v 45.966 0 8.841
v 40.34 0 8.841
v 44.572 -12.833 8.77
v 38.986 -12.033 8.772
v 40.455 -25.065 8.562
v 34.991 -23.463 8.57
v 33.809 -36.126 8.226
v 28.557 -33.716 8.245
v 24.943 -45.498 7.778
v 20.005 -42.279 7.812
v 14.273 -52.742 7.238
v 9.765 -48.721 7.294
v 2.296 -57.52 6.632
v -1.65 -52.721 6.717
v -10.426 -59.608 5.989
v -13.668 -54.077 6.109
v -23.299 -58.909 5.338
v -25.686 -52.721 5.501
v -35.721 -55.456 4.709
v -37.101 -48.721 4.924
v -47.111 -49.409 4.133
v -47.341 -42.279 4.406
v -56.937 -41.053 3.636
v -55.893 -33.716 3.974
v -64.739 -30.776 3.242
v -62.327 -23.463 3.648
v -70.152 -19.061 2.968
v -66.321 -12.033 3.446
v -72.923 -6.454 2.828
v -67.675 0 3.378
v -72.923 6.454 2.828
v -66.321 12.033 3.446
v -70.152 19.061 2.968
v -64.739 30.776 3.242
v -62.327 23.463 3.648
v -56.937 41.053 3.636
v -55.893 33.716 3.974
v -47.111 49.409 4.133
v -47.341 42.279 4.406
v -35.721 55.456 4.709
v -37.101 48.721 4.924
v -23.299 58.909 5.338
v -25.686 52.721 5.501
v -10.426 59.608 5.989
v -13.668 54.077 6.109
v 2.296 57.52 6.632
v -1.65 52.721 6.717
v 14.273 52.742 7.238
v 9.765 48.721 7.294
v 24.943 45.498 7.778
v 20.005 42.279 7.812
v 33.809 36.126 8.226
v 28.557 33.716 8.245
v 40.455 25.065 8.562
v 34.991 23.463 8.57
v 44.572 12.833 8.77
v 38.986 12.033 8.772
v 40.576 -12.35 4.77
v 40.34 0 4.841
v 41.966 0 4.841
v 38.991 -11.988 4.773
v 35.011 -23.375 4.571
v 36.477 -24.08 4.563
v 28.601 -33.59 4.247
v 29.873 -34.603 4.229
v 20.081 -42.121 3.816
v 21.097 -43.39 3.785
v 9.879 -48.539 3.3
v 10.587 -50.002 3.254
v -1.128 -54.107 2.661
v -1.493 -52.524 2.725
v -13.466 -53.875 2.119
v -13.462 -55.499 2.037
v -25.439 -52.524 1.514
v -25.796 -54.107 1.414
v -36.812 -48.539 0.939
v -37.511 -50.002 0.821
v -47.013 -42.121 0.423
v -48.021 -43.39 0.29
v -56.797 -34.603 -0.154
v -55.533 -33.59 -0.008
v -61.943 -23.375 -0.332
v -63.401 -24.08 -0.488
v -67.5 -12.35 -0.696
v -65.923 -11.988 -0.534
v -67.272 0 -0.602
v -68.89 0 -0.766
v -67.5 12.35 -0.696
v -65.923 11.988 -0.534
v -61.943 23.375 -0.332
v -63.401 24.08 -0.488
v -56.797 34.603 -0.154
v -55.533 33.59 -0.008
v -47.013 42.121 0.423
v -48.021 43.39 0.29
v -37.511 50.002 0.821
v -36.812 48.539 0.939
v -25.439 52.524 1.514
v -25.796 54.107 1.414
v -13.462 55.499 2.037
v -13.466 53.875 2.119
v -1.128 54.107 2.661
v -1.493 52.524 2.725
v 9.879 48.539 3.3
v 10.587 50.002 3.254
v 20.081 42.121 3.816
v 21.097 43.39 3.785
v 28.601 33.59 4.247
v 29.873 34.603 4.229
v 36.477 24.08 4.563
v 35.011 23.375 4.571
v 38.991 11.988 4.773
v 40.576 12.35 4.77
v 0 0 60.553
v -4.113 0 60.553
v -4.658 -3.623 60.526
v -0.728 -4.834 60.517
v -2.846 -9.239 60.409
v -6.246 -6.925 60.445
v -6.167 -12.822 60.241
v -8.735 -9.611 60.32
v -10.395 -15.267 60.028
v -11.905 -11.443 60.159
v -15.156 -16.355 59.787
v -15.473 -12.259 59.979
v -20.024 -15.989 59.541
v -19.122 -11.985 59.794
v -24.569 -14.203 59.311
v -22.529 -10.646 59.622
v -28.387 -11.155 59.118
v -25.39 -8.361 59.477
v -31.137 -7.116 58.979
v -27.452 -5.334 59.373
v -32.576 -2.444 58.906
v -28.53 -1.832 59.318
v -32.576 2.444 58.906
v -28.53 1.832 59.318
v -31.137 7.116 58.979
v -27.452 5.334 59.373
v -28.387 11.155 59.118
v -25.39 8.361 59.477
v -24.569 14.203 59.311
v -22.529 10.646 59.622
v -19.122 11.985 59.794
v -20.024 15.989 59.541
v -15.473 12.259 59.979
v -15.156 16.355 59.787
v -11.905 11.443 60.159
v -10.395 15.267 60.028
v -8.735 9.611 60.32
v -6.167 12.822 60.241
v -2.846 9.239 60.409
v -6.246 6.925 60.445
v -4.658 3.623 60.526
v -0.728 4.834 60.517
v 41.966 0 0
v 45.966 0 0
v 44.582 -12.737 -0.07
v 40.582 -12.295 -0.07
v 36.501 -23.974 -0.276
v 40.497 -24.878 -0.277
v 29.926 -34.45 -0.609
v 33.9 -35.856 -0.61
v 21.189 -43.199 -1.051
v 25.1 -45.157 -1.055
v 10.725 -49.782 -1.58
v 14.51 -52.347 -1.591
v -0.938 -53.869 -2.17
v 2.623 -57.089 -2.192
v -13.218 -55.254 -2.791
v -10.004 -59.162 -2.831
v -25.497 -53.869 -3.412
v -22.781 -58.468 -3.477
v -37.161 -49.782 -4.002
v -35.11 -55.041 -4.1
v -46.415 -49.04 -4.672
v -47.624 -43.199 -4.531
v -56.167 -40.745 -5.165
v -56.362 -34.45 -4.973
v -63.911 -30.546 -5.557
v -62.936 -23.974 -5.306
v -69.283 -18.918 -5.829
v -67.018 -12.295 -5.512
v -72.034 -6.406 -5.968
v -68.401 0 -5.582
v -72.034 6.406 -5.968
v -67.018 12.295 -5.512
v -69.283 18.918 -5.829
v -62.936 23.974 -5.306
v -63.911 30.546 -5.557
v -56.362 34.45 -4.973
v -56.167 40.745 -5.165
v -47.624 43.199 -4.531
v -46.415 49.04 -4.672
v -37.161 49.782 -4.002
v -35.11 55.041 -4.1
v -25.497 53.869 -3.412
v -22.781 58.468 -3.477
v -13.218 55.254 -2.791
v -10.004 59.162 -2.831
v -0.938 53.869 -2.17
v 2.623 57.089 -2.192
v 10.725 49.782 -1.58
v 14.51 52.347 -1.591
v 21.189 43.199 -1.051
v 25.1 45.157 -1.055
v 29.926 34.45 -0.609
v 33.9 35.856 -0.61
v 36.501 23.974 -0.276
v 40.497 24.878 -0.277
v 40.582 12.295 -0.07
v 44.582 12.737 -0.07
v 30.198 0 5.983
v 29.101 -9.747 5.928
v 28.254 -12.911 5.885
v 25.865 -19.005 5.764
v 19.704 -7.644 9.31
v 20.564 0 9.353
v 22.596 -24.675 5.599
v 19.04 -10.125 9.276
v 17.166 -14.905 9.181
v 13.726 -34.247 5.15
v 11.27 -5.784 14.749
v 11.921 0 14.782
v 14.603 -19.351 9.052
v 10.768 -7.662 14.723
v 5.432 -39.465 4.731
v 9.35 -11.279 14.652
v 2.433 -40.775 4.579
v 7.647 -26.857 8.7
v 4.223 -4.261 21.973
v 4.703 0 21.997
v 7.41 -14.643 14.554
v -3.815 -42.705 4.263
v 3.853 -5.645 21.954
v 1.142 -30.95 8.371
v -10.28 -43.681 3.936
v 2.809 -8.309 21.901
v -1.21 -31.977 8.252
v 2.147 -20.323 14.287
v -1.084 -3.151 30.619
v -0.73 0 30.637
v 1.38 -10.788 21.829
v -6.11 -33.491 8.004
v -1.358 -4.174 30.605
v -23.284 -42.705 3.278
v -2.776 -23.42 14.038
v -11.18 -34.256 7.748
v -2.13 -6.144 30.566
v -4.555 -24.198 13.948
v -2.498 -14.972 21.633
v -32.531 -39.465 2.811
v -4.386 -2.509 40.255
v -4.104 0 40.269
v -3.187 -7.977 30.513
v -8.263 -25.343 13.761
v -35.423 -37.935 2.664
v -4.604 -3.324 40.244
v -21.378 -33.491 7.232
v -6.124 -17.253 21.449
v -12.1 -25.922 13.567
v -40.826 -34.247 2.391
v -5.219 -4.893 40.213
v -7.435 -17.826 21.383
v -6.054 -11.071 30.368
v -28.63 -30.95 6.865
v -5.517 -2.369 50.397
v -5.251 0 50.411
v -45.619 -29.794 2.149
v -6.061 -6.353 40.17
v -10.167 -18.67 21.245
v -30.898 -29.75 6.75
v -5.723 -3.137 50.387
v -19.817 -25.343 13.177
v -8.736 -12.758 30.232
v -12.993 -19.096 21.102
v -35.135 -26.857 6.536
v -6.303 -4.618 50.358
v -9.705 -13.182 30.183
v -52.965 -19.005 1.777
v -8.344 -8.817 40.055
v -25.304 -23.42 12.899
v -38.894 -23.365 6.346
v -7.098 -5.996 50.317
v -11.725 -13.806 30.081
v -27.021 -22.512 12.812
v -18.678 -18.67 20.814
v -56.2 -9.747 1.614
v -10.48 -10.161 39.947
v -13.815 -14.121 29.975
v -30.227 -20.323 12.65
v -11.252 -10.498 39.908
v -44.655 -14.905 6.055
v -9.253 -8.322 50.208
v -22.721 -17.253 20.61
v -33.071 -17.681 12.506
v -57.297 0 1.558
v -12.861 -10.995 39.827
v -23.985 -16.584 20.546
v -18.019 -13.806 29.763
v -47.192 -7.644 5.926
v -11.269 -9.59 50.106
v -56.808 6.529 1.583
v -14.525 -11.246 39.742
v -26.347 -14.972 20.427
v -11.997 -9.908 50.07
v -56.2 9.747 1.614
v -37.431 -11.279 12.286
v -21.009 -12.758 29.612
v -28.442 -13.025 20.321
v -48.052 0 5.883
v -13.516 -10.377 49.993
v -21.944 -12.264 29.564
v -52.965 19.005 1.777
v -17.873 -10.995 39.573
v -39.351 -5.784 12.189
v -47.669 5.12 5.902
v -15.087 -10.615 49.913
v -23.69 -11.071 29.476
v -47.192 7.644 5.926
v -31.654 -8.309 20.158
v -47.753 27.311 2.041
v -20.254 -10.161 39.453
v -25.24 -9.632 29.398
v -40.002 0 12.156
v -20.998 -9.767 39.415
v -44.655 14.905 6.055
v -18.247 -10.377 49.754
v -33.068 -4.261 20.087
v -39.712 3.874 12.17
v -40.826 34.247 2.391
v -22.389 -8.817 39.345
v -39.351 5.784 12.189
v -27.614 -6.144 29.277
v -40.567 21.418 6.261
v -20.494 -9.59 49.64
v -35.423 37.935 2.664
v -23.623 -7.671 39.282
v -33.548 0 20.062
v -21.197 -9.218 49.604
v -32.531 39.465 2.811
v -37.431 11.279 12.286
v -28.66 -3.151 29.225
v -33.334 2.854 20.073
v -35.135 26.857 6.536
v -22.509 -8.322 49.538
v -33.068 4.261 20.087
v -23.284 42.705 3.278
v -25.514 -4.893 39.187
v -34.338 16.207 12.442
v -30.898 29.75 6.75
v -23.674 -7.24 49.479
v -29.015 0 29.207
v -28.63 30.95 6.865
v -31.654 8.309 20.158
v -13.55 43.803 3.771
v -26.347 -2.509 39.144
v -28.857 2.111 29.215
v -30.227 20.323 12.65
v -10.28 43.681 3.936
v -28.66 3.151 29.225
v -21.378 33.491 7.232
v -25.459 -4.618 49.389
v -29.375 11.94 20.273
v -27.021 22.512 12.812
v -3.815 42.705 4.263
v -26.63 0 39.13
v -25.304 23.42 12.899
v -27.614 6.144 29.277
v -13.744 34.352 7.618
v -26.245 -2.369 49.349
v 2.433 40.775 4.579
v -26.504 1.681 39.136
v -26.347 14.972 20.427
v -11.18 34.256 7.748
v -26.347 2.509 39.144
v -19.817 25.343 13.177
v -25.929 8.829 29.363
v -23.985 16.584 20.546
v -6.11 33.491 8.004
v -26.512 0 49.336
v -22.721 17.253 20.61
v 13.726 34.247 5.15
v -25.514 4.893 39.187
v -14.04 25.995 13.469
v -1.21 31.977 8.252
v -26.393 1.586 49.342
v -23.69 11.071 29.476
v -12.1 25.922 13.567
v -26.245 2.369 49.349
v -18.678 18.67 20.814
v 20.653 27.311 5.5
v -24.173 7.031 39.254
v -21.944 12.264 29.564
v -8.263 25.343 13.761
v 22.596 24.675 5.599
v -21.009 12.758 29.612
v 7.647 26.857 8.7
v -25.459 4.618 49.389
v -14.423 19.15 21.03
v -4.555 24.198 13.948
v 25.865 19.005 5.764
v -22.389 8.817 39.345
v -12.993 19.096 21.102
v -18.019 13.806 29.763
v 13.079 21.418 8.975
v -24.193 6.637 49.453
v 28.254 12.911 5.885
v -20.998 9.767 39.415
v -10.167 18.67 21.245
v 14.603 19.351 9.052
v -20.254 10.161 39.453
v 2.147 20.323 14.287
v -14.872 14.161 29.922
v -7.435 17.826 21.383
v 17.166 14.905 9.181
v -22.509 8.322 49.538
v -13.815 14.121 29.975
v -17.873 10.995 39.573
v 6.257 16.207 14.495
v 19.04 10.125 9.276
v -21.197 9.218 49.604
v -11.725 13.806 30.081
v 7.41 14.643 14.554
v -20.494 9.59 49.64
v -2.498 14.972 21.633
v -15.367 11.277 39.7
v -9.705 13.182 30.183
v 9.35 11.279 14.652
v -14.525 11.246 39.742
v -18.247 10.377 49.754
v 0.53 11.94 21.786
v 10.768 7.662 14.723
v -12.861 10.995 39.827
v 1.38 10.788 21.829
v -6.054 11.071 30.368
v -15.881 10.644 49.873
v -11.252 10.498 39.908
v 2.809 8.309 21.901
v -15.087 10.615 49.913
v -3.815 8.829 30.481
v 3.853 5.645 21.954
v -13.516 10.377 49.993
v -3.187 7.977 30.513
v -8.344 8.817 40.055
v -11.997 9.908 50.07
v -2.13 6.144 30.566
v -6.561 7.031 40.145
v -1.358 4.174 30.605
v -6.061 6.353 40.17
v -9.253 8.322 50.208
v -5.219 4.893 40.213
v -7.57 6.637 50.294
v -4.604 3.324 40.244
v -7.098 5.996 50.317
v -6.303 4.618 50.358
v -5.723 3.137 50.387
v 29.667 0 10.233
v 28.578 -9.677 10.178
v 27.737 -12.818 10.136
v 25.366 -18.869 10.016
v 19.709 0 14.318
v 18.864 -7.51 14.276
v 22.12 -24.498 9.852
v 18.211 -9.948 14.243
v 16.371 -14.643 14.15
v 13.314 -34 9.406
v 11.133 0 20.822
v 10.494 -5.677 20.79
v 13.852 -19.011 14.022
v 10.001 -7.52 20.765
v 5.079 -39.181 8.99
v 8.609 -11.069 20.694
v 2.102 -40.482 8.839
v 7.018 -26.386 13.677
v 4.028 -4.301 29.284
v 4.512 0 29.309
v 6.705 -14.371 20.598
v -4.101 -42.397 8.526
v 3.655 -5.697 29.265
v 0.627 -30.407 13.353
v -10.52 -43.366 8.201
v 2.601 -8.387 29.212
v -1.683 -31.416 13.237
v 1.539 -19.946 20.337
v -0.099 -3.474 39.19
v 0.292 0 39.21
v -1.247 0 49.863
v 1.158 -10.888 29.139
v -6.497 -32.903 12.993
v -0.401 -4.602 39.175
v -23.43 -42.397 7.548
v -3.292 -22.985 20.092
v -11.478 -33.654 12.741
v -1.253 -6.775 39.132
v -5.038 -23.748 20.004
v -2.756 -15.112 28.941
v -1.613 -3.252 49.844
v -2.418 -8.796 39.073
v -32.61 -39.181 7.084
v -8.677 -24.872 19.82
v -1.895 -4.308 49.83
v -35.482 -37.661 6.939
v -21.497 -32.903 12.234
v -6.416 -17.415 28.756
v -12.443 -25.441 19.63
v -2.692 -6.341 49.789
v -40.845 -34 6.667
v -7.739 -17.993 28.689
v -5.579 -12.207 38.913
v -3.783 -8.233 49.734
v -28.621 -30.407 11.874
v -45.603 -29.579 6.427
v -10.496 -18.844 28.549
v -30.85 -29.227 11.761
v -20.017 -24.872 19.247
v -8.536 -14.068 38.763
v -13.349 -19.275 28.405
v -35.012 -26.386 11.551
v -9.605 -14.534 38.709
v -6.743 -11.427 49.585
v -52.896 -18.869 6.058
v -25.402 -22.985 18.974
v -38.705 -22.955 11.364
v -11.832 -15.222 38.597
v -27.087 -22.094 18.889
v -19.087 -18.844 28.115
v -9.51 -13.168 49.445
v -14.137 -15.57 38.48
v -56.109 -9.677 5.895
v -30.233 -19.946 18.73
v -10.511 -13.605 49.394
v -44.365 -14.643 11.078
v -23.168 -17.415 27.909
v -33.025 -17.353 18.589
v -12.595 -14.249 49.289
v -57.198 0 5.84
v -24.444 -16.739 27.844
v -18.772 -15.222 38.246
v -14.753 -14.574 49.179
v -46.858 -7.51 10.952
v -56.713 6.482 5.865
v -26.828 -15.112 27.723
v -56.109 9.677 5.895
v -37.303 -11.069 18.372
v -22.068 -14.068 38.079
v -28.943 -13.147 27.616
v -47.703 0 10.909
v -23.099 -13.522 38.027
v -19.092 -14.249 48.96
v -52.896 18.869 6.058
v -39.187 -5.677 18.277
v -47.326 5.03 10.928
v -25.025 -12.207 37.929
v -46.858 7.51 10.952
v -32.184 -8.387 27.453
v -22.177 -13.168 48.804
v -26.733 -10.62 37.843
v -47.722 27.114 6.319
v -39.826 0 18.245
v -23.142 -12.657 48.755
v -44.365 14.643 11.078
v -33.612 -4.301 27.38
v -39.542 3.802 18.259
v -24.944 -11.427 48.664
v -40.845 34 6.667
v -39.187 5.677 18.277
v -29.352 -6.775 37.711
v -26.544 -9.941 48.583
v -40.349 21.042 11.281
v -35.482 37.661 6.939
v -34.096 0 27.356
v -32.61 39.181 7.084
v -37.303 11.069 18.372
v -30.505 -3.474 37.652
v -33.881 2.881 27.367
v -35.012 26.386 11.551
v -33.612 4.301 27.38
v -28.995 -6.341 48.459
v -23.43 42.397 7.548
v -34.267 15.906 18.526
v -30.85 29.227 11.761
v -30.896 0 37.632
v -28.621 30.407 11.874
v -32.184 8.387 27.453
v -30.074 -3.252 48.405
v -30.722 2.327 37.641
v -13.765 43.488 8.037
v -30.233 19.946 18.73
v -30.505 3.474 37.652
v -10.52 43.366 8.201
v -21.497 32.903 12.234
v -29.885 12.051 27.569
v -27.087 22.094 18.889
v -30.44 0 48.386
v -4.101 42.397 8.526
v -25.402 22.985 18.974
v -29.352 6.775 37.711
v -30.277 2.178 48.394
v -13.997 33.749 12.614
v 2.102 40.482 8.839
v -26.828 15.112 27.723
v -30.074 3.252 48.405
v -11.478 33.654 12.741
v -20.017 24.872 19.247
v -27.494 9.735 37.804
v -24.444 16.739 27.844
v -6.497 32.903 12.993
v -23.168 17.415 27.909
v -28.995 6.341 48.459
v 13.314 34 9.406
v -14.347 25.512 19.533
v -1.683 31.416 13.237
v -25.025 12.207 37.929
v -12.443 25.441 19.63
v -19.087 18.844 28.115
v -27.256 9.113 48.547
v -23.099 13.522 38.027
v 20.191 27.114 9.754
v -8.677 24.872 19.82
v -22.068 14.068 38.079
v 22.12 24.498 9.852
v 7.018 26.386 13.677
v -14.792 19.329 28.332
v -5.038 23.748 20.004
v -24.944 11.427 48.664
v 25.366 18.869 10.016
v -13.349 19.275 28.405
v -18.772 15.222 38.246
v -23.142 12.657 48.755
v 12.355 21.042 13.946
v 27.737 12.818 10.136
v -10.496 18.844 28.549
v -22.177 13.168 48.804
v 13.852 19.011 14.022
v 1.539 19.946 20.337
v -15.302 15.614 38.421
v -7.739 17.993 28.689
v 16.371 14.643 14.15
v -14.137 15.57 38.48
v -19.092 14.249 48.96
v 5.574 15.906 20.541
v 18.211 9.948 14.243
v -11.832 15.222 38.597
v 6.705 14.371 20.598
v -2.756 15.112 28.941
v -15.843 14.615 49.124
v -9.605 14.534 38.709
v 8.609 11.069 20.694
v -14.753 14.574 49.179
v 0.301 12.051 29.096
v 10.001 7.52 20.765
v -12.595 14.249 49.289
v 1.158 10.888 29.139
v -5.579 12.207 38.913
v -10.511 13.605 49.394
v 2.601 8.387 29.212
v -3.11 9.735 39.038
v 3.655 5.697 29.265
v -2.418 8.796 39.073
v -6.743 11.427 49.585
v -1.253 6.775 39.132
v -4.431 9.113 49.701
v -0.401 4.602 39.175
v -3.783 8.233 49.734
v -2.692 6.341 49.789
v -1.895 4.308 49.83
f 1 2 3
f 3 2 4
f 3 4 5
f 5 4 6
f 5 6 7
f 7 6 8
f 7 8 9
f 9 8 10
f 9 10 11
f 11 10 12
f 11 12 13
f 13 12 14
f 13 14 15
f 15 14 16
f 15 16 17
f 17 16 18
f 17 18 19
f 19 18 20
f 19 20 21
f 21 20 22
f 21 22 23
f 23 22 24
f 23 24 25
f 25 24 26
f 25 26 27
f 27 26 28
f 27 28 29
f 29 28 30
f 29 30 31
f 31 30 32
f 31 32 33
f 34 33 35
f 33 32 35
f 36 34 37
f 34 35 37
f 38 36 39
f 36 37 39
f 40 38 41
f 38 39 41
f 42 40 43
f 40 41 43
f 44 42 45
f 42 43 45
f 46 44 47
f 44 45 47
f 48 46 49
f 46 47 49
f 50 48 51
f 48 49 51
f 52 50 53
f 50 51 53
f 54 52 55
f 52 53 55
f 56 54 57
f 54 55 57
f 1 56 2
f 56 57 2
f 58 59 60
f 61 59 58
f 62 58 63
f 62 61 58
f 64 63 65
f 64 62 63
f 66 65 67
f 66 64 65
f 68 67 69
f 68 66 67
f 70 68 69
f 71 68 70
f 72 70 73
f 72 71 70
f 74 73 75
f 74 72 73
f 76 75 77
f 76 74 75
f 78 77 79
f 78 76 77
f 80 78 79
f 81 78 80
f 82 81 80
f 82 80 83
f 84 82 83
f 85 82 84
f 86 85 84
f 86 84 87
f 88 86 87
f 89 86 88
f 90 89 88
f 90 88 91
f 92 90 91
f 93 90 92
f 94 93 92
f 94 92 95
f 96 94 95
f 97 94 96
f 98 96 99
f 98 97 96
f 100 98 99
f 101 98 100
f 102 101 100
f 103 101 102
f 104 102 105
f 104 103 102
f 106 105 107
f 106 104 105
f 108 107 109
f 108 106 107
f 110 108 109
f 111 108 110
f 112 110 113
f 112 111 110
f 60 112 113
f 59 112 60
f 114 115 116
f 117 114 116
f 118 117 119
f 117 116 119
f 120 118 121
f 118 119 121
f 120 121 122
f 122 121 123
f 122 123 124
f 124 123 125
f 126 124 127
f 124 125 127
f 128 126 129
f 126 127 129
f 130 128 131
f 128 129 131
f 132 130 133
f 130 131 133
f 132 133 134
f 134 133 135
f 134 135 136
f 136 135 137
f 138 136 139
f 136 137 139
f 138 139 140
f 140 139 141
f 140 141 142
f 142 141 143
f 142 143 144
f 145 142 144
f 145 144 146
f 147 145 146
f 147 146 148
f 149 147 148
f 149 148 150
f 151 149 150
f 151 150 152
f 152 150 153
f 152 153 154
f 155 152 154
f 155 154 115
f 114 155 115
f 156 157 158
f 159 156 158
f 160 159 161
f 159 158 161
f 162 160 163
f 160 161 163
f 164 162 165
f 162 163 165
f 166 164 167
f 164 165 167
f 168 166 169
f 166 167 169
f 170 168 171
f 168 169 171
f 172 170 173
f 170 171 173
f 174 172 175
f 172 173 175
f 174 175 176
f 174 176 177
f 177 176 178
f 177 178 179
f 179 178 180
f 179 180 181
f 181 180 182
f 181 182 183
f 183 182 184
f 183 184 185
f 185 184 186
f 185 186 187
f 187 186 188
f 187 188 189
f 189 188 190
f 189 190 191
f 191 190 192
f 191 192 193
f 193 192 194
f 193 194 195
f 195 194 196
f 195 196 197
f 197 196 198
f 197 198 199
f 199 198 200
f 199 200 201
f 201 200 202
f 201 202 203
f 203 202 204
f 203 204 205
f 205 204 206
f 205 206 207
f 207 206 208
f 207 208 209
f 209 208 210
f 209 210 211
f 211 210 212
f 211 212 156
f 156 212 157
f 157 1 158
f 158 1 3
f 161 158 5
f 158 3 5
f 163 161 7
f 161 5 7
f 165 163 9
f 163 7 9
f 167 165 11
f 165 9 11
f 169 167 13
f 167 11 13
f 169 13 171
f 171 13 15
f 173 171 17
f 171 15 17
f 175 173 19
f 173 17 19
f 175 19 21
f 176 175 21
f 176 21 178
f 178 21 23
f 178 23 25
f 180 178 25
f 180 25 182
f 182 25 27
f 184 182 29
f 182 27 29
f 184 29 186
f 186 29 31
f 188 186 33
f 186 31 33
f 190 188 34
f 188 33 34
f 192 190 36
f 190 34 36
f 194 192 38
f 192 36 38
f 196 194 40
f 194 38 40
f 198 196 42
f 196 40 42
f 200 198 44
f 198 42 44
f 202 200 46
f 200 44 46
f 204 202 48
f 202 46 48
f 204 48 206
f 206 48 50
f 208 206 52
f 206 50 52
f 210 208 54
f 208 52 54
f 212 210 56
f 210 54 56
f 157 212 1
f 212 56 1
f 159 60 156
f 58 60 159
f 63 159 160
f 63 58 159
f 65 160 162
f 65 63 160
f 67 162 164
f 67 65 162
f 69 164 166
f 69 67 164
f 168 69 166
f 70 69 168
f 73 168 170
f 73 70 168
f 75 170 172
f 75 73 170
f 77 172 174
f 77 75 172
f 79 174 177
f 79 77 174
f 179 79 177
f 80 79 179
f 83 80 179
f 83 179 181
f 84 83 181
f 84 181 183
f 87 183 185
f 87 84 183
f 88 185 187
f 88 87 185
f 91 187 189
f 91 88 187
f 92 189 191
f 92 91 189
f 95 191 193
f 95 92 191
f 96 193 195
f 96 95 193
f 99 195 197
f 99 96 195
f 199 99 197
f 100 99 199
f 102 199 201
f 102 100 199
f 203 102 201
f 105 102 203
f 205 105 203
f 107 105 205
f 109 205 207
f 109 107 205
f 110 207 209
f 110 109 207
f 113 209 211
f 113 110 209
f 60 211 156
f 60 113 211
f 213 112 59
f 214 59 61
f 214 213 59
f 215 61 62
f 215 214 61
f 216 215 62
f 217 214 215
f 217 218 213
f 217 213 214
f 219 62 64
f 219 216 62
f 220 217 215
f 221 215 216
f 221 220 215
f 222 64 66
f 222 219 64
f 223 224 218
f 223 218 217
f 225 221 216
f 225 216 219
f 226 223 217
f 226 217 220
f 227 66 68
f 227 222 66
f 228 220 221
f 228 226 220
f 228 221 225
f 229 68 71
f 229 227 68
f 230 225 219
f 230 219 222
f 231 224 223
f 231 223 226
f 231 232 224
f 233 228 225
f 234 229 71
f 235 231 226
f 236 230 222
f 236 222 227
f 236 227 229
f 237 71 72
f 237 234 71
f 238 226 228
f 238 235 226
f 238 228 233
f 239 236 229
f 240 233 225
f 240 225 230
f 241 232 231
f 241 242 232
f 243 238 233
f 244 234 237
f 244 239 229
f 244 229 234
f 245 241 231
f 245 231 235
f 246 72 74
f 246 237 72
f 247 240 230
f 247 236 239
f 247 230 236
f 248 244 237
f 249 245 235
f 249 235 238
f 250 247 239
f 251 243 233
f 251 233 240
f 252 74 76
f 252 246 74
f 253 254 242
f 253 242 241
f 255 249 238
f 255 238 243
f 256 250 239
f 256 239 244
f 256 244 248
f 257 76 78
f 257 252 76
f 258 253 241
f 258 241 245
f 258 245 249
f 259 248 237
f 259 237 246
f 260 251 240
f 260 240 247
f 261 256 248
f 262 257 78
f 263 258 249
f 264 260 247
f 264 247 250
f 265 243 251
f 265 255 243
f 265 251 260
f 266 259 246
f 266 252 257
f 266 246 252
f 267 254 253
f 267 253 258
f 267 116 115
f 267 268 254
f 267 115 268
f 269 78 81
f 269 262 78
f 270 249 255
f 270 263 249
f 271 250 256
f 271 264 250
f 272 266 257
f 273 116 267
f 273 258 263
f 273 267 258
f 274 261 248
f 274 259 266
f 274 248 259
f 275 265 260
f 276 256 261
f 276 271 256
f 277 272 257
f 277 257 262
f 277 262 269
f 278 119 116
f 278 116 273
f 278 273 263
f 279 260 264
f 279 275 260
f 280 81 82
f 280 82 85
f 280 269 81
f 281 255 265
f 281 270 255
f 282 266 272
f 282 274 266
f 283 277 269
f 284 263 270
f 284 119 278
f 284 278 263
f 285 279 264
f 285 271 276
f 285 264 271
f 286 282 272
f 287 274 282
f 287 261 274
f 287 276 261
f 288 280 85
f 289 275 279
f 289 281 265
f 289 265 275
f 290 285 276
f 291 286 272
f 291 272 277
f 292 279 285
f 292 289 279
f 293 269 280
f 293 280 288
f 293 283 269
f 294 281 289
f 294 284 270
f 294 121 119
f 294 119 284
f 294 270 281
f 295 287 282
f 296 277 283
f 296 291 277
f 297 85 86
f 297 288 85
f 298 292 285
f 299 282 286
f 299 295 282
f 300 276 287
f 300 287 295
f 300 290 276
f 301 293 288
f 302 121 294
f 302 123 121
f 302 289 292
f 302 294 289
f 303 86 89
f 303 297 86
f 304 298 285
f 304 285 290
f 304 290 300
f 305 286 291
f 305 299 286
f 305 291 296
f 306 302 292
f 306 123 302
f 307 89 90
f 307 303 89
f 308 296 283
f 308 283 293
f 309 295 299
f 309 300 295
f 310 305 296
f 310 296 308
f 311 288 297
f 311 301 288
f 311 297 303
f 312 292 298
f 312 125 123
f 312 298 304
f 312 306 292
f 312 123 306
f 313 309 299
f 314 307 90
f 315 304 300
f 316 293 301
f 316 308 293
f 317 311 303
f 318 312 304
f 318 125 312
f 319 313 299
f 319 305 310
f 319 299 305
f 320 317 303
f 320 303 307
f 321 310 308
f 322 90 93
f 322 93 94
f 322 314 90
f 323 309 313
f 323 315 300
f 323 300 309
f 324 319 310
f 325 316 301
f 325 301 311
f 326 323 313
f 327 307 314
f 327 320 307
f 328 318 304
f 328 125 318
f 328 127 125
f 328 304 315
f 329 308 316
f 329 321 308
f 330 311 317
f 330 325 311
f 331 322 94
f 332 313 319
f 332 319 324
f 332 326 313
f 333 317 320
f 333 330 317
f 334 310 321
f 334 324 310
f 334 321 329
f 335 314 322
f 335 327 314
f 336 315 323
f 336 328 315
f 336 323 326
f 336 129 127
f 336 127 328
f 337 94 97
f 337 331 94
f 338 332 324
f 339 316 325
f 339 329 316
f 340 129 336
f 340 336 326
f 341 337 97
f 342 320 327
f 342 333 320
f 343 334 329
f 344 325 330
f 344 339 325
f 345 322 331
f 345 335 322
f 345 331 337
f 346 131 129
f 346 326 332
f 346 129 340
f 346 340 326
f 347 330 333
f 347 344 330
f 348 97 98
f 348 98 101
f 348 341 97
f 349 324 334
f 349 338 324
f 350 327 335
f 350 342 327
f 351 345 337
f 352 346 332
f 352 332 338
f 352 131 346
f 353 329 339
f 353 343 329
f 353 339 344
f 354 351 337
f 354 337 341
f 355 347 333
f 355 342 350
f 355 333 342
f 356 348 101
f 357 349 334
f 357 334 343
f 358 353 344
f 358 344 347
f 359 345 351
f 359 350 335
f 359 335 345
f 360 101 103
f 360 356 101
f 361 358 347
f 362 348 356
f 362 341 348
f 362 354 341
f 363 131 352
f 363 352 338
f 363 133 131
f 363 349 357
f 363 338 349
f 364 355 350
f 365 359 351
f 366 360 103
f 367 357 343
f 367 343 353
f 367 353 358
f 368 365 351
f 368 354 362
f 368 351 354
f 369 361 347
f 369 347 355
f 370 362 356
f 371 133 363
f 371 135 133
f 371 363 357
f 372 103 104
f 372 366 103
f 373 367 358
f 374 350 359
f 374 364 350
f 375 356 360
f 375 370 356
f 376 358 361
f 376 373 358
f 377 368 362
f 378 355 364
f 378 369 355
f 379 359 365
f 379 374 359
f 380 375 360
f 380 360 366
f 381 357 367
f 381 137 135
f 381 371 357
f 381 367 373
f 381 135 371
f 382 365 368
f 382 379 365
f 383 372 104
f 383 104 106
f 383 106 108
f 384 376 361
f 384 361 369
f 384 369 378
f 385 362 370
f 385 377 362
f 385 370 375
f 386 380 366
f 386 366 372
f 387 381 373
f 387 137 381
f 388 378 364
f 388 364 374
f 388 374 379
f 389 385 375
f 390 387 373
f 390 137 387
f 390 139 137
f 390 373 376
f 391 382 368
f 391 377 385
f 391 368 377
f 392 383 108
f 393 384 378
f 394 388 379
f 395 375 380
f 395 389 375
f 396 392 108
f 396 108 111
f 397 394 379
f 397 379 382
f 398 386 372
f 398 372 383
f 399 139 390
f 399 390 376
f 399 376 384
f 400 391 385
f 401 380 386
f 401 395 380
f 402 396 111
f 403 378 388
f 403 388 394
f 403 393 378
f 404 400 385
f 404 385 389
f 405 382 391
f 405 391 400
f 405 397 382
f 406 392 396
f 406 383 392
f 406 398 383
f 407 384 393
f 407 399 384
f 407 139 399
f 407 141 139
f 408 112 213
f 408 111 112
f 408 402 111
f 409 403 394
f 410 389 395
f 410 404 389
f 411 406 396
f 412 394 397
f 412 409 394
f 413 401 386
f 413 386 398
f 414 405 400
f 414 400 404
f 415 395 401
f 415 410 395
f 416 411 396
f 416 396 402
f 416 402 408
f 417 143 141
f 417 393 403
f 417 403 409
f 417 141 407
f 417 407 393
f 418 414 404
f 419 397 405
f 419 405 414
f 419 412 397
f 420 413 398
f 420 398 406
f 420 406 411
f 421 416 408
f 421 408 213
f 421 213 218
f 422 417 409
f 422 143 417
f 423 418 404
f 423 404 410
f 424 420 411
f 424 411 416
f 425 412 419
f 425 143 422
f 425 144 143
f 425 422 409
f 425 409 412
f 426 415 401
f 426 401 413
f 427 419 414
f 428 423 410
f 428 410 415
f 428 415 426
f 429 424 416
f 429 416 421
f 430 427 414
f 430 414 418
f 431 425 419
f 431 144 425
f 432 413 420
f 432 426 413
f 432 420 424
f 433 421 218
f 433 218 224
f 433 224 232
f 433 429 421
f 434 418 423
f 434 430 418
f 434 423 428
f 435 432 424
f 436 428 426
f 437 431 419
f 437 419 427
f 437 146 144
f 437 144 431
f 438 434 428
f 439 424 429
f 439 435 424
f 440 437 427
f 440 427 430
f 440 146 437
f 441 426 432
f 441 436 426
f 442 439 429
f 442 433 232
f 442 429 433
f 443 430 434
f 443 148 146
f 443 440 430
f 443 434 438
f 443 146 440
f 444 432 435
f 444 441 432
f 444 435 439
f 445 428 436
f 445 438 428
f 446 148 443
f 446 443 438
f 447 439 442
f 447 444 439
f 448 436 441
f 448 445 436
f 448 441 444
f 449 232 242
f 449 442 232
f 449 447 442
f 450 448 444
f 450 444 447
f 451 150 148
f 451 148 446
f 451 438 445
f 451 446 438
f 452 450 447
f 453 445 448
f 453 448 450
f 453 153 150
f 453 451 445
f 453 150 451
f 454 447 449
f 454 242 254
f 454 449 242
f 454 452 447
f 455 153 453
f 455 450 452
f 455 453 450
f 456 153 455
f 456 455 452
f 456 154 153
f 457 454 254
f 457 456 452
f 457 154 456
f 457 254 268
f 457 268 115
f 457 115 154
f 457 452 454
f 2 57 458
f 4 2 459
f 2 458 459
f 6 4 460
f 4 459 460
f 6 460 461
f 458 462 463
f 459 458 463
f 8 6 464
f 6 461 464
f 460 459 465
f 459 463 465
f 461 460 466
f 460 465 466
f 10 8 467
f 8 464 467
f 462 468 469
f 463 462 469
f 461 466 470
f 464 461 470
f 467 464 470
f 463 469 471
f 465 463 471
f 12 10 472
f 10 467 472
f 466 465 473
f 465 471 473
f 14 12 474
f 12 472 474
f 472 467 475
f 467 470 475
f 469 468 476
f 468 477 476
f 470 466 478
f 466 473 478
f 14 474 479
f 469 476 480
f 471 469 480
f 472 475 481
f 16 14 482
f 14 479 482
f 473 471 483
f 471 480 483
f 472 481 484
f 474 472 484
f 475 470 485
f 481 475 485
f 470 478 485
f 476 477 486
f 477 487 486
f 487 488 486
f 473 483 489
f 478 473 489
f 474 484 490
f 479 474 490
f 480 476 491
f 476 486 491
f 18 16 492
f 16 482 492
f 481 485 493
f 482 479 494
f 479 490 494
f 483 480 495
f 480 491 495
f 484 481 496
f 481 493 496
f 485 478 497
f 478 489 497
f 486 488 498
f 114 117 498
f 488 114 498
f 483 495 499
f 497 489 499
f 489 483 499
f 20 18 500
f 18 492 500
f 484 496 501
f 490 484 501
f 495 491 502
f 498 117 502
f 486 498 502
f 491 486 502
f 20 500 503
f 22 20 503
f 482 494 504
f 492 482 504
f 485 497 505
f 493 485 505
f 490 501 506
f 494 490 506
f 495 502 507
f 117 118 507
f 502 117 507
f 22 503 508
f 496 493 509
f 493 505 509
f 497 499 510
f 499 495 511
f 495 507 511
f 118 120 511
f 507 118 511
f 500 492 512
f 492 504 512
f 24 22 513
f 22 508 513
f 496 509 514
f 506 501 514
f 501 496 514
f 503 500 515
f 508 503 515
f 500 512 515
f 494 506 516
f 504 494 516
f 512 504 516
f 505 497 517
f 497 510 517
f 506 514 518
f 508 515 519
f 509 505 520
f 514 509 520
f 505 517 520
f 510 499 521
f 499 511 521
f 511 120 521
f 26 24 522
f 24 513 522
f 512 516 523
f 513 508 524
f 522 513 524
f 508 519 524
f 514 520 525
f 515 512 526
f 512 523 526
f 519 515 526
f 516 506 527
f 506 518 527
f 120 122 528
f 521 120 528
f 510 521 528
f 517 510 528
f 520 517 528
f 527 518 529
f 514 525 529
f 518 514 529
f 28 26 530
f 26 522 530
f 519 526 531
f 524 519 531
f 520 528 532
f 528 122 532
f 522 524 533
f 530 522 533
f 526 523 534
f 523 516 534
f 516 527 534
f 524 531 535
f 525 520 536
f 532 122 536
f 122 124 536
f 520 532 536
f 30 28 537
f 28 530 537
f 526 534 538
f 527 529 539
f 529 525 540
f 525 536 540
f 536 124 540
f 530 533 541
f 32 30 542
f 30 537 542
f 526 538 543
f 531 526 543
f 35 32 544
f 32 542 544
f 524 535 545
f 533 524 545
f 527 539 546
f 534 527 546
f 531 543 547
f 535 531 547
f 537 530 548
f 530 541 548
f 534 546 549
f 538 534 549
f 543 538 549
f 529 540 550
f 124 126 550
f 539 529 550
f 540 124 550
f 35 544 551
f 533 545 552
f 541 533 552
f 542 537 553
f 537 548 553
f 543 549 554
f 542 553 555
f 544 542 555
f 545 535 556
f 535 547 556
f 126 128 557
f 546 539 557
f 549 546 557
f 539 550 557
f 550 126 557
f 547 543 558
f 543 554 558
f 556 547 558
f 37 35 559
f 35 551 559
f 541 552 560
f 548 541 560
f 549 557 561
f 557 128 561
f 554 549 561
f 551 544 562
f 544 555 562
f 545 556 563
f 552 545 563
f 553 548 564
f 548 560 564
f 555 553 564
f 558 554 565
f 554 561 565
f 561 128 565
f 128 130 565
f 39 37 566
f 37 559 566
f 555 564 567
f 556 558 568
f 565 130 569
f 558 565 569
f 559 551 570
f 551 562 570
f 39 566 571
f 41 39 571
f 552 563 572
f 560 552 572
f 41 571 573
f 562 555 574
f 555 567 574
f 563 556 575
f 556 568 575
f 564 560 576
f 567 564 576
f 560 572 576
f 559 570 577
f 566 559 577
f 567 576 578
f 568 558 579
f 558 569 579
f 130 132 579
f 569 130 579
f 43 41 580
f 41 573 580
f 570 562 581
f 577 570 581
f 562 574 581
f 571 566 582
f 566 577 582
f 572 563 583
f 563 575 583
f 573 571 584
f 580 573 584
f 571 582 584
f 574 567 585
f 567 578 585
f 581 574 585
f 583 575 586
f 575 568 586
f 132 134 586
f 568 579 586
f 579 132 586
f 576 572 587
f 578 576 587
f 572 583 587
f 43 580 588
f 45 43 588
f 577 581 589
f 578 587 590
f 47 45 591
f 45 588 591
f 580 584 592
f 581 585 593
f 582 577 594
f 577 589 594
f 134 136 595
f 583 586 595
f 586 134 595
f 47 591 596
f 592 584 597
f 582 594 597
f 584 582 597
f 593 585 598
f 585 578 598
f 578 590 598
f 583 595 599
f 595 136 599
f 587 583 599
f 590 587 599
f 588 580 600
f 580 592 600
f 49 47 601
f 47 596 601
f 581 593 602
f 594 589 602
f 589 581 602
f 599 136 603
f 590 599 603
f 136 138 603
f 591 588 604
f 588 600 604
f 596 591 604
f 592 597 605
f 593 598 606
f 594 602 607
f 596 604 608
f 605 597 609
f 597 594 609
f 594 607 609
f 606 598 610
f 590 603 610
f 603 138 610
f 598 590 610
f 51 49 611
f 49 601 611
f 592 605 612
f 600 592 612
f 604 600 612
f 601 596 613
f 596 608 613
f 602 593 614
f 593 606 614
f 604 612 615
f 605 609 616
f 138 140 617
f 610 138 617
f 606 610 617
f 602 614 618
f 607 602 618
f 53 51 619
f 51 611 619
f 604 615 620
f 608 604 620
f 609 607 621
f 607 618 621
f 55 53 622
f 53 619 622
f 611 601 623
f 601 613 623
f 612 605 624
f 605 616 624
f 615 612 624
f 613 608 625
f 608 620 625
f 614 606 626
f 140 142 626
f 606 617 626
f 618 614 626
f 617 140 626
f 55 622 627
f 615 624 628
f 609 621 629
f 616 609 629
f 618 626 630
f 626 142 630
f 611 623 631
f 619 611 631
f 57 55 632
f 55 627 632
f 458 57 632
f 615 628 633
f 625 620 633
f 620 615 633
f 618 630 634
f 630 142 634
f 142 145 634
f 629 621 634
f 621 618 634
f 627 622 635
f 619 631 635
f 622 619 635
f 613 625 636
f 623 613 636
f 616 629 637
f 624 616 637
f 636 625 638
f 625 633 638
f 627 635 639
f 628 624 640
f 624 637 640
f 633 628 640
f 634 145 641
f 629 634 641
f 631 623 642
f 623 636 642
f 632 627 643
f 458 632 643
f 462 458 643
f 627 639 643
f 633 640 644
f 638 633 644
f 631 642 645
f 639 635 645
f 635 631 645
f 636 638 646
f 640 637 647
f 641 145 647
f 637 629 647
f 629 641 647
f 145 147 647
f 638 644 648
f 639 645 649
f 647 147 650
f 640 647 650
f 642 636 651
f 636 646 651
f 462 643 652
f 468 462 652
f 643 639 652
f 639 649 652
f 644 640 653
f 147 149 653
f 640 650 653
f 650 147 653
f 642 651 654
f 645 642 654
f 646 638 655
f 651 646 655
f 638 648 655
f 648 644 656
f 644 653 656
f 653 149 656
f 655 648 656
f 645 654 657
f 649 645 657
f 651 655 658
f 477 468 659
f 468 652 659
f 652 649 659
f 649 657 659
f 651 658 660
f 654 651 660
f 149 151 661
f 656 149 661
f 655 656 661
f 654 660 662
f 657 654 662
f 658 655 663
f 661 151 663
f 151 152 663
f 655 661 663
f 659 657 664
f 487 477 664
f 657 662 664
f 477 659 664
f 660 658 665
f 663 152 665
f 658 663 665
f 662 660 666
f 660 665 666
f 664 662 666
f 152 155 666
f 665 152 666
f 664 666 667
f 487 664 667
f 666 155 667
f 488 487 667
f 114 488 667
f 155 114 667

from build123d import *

# Parameters (mm, degrees)
F2_T = -4


with BuildPart() as f1:
    # F0 (on Front) → F1 (revolve)
    with BuildSketch(Plane.XZ):
        with BuildLine():
            Line((-16.4214689285, 60.553342104), (-13.3589282632, 0))
            Line((-13.3589282632, 0), (45.9656976163, 0))
            Line((45.9656976163, 0), (45.9656976163, 8.8407509029))
            Line((45.9656976163, 8.8407509029), (40.3396114707, 8.8407509029))
            ThreePointArc((40.3396114707, 8.8407509029), (7.5467908298, 24.8501696587), (0, 60.553342104))
            Line((0, 60.553342104), (-16.4214689285, 60.553342104))
        make_face()
    revolve(axis=Axis((-14.8901985958, 0, 30.276671052), (0.0505113539, 0, -0.9987234868)))

    # F2
    f2_openings = [f1.faces().sort_by_distance(p)[0] for p in [
        (-24.590306, 0, 59.72493),
        (-42.869881, 0, -2.992742),
    ]]
    offset(amount=F2_T, openings=f2_openings)


solid = f1.part
